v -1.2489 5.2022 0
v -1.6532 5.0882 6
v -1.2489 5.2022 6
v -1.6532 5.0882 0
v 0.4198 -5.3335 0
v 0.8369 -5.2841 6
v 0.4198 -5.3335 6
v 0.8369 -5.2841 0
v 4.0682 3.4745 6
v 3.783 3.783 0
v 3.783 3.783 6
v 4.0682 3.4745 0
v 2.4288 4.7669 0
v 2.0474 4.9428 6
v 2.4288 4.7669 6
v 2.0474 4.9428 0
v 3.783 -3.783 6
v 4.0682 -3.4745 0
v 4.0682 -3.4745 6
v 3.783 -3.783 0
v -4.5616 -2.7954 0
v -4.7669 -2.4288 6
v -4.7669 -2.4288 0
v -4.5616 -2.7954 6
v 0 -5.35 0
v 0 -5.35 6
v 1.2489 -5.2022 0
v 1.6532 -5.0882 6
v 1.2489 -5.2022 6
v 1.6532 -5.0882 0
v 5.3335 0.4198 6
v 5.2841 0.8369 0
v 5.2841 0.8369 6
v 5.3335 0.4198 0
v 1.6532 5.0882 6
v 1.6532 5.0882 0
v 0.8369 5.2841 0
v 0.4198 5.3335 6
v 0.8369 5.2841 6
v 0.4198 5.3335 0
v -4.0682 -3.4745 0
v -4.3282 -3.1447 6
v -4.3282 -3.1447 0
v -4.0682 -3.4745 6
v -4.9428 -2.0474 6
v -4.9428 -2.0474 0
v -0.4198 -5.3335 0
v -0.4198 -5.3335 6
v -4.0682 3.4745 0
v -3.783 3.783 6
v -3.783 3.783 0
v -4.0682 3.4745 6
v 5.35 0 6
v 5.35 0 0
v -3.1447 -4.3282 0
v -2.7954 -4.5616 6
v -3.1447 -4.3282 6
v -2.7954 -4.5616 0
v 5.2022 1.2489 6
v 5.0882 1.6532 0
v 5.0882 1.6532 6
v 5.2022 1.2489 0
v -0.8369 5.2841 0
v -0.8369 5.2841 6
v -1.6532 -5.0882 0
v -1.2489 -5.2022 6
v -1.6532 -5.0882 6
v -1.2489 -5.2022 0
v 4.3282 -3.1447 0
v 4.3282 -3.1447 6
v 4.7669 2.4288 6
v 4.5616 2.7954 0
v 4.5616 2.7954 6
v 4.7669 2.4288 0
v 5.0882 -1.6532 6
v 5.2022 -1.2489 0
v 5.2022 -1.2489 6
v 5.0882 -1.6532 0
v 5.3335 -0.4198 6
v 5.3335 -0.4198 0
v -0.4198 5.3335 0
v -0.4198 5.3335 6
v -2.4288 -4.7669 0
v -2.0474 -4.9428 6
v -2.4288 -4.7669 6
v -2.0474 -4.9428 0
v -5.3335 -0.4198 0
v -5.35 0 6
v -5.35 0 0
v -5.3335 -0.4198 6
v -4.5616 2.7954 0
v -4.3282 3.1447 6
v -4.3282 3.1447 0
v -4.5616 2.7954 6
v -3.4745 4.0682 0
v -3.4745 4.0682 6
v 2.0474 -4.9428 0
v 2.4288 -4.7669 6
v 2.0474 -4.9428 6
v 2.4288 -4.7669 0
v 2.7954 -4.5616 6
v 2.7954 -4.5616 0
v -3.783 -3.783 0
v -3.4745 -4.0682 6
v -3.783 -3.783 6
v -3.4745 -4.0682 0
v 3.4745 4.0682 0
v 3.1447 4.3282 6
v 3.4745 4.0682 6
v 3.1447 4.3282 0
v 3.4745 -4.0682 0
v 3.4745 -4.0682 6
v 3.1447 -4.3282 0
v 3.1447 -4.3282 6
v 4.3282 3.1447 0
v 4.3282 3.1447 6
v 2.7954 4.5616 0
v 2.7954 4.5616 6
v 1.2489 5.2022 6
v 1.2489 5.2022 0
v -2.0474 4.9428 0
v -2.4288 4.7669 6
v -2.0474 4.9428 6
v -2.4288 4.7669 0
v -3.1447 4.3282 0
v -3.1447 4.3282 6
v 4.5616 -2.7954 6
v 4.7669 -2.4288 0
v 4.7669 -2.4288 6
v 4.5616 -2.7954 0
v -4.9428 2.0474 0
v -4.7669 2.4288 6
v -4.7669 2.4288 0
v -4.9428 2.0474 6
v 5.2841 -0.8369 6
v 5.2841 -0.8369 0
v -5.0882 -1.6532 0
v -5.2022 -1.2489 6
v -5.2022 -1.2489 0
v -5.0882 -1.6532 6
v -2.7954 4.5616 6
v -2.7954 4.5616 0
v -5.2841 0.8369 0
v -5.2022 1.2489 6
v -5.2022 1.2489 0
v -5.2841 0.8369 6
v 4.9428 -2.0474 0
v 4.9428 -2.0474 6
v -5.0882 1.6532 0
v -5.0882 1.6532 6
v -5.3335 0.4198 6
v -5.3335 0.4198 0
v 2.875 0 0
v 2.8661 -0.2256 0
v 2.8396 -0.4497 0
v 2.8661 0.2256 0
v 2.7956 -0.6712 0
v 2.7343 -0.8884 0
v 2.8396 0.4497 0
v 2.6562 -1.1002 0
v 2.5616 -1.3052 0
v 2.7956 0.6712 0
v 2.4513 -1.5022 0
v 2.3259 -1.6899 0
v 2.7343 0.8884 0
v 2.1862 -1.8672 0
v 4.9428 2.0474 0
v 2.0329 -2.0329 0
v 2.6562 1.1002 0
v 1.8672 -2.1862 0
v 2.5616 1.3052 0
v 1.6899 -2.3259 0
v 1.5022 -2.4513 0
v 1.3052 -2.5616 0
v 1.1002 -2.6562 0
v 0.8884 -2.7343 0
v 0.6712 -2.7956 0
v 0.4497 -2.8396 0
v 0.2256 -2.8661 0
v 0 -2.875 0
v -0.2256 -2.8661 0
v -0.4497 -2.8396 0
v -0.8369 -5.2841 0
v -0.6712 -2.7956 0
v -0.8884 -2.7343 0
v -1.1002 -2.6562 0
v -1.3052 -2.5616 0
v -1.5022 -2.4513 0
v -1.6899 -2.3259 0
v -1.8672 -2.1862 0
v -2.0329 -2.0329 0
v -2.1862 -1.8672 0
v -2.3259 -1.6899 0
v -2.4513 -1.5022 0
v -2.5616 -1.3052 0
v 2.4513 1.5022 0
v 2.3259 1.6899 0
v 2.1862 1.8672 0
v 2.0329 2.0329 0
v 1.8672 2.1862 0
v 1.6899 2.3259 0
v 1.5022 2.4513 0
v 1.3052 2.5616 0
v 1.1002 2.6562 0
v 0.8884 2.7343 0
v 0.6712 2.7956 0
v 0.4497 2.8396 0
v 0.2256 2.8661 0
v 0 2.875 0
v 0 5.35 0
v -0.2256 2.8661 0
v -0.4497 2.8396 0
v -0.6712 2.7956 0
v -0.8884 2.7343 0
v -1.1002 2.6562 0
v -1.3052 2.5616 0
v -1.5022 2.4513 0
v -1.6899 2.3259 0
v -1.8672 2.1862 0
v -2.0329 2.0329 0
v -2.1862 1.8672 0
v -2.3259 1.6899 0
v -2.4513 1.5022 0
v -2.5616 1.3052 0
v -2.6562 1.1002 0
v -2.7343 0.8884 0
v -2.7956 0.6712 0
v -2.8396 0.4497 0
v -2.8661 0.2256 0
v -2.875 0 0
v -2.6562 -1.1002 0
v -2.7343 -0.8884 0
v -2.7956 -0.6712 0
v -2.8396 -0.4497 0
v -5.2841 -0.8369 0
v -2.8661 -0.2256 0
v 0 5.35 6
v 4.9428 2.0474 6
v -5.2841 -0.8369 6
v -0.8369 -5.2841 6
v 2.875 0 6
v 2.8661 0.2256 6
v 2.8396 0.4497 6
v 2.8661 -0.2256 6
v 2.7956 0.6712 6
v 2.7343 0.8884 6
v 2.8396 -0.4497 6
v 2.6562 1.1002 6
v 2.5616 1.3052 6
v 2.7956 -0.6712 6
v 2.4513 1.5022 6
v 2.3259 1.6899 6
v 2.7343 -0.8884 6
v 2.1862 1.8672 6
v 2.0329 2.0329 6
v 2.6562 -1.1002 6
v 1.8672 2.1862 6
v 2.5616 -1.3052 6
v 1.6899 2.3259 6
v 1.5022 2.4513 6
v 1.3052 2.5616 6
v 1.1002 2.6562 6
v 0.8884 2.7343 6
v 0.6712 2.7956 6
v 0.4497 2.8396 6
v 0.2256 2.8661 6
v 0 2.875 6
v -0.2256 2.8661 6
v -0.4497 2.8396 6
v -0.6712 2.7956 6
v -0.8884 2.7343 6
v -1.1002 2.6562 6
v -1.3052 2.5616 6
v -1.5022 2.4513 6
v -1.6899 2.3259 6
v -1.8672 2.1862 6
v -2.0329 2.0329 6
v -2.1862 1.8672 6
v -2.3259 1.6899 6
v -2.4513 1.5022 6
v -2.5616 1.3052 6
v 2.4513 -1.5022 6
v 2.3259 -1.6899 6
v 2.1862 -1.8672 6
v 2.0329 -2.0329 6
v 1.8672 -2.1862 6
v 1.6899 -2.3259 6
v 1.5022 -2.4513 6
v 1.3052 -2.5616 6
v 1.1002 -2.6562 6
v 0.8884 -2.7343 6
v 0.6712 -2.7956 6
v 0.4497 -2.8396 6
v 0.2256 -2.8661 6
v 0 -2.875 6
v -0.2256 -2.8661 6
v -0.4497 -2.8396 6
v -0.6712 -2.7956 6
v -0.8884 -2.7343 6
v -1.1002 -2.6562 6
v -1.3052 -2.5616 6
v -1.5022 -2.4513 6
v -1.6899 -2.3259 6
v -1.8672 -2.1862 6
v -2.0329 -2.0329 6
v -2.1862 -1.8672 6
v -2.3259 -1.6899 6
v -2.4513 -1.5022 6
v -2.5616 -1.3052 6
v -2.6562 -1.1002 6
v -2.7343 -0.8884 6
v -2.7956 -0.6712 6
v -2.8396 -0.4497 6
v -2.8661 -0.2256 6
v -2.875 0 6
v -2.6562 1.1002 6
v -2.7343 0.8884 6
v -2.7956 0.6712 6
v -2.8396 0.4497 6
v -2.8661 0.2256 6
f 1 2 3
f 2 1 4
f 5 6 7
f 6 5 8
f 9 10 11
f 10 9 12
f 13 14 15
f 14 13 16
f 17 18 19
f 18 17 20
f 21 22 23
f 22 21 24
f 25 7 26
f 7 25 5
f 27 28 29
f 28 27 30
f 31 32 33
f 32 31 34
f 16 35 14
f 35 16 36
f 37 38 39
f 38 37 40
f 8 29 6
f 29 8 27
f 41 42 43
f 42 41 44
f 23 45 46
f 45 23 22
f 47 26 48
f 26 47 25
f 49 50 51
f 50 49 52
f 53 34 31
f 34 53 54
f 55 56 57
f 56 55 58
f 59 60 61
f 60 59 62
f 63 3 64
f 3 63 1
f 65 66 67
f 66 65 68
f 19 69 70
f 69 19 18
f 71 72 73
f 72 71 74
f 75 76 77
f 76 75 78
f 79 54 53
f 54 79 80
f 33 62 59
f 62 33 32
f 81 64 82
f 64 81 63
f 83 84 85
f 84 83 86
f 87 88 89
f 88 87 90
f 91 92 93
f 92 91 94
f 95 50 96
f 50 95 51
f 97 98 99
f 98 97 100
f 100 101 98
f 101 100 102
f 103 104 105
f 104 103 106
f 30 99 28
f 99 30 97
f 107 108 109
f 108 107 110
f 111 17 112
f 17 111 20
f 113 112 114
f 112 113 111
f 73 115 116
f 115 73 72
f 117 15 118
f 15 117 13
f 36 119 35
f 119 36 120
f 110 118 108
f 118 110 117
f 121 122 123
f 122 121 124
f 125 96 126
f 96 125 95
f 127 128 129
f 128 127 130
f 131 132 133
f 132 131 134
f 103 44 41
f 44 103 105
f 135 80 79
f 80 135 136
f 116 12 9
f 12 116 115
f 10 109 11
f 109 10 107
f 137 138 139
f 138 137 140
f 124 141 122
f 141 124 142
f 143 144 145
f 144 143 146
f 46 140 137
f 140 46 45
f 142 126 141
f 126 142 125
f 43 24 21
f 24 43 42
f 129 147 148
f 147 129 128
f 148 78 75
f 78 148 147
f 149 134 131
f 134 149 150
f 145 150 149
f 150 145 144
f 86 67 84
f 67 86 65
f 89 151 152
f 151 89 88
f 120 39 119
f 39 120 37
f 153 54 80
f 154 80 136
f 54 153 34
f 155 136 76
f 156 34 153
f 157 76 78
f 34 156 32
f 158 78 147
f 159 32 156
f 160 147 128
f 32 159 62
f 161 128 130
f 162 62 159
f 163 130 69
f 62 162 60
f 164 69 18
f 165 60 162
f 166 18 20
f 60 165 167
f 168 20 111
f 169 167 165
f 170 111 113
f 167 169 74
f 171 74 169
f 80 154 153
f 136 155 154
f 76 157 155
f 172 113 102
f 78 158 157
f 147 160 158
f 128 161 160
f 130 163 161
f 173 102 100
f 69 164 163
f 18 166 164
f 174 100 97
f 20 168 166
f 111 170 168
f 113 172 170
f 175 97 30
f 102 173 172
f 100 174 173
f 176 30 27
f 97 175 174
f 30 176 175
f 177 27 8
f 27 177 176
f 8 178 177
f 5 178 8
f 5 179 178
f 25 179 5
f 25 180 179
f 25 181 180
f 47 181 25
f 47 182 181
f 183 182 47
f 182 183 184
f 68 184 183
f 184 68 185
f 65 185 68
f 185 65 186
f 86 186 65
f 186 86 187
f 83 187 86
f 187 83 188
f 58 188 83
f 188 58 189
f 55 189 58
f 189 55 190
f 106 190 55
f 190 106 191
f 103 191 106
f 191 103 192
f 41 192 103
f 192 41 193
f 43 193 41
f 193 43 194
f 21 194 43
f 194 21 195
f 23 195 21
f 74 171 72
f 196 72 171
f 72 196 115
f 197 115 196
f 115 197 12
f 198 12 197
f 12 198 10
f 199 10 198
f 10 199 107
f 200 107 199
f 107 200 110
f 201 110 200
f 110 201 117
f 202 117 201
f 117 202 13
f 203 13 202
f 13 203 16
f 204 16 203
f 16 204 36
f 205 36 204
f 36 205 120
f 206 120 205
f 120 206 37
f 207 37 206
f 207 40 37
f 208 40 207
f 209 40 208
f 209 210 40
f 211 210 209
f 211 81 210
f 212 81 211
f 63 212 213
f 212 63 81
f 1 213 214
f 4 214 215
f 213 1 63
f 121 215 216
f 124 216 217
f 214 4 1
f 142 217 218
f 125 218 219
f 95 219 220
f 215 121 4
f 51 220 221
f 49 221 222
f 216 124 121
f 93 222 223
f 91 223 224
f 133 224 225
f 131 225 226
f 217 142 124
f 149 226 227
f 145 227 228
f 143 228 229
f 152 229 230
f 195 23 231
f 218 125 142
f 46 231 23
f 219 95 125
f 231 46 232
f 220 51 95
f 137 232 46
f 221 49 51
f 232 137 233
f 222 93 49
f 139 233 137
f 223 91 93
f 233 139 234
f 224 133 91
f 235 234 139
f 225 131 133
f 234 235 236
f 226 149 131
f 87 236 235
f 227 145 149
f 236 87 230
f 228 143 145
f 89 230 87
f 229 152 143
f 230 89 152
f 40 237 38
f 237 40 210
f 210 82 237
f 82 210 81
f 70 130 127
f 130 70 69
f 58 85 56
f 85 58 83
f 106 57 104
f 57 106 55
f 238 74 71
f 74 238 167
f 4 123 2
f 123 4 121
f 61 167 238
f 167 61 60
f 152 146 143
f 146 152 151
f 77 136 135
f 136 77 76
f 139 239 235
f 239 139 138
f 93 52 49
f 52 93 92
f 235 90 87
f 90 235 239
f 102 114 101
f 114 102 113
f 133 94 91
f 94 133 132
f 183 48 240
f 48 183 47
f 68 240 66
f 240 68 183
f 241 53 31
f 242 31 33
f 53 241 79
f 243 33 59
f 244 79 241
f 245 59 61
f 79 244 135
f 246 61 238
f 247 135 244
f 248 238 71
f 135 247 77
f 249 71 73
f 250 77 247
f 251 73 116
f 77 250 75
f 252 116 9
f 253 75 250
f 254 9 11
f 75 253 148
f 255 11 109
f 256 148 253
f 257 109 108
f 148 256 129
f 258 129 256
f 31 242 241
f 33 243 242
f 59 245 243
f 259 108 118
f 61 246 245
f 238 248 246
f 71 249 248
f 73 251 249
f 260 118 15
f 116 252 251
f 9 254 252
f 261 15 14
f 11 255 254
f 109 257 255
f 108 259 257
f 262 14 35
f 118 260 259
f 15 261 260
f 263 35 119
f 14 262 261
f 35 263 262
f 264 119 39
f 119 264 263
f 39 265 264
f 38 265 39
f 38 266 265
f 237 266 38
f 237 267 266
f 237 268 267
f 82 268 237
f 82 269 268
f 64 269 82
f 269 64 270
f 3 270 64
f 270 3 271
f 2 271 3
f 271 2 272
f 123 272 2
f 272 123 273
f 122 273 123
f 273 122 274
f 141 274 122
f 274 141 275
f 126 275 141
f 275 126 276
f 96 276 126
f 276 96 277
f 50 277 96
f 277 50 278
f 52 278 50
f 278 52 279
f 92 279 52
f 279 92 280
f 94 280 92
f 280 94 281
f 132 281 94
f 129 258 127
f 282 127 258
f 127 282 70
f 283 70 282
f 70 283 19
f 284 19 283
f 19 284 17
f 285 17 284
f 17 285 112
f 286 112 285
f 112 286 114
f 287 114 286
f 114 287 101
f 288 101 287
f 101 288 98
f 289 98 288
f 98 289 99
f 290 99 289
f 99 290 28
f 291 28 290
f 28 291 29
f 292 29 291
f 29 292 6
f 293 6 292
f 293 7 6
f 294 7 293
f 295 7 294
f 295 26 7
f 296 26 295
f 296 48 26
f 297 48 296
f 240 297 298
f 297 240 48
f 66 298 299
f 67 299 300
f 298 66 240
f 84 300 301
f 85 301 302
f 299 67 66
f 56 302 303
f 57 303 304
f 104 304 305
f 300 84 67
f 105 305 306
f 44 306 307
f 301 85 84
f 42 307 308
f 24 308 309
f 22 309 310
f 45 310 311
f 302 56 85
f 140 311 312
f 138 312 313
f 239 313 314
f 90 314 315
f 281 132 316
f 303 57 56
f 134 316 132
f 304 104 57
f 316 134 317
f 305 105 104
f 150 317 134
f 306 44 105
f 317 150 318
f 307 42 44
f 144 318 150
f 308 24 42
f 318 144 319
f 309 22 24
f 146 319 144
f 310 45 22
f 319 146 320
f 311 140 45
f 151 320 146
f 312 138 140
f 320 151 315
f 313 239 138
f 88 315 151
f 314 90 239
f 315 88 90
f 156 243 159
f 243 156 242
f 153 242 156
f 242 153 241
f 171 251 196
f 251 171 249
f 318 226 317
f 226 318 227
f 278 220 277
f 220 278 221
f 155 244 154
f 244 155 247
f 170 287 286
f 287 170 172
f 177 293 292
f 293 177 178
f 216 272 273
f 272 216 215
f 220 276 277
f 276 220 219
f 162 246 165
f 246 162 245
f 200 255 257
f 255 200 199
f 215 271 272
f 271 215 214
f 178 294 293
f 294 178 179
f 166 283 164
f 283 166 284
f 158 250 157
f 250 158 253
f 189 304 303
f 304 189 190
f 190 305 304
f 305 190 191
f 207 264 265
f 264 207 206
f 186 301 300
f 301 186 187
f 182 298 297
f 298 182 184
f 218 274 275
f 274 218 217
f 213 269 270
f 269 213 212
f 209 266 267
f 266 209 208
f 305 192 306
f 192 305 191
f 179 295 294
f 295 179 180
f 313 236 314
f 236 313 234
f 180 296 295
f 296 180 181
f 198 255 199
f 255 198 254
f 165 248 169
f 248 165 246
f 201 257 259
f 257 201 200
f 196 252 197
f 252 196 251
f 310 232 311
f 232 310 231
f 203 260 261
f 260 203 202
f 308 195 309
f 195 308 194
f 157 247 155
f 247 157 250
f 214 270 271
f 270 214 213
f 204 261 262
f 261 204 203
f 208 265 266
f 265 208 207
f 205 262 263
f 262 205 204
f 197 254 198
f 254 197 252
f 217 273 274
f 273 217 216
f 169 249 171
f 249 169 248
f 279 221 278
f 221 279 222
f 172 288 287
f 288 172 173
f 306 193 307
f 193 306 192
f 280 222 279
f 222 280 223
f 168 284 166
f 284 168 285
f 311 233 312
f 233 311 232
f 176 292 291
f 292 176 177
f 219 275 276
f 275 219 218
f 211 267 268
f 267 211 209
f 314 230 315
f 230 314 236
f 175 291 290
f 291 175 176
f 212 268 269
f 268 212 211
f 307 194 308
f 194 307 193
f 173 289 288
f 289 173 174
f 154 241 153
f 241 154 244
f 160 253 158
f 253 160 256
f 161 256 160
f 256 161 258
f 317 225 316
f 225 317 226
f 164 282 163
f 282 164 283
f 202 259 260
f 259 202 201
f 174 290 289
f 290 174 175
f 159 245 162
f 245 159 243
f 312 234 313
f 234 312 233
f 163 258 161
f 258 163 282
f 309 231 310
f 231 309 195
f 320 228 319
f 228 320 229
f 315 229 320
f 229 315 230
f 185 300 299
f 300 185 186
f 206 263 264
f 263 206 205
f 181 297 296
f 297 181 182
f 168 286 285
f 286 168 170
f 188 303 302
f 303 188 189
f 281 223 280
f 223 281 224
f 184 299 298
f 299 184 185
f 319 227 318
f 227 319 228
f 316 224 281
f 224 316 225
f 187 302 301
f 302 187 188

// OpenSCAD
// file: ../shapes.scad
FACES   = 180;
EPSILON = 0.1;
PIN	    = 2.54;


module tube(h=1, inner=0, outer=0, di=0, do=0) {
    rInner = inner > 0 ? inner : di / 2;
    rOuter = outer > 0 ? outer : do / 2;

	if (rInner >= rOuter) echo("ERROR in tube. rOuter must be > rInner.");

	difference() {
		cylinder(h=h, r=rOuter);
		translate([0,0,-EPSILON]) {
			cylinder(h=h + EPSILON*2, r=rInner);
		}
	}
}

module roundedRect(size, r, up="z")
{
	if (up == "x") {
		H = size[0];
		hull()
		{
			translate([0, r, r]) rotate([0, 90, 0]) cylinder(r=r, h=H);
			translate([0, size[1] - r, r]) rotate([0, 90, 0]) cylinder(r=r, h=H);
			translate([0, r, size[2] - r]) rotate([0, 90, 0]) cylinder(r=r, h=H);
			translate([0, size[1] - r, size[2] - r]) rotate([0, 90, 0]) cylinder(r=r, h=H);
		}
	}
	else if (up == "y") {
		H = size[1];
		hull()
		{
			translate([r, 0, r]) rotate([-90, 0, 0]) cylinder(r=r, h=H);
			translate([size[0] - r, 0, r]) rotate([-90, 0, 0]) cylinder(r=r, h=H);
			translate([r, 0, size[2] - r]) rotate([-90, 0, 0]) cylinder(r=r, h=H);
			translate([size[0] - r, 0, size[2] - r]) rotate([-90, 0, 0]) cylinder(r=r, h=H);
		}
	}
	else {
		H = size[2];
		hull()
		{
			translate([r, r, 0])  cylinder(r=r, h=H);
			translate([size[0] - r, r, 0])  cylinder(r=r, h=H);
			translate([r, size[1] - r, 0])  cylinder(r=r, h=H);
			translate([size[0] - r, size[1] - r, 0])  cylinder(r=r, h=H);
		}
	}
}

module cubePair(x, size)
{
	translate([x, 0, 0])
		cube(size=size);
	mirror([1,0,0]) translate([x, 0, 0])
		cube(size=size);
}

module polygonXY(h, points)
{
    linear_extrude(height = h) {
        polygon(points=points);
    }  
}

module polygonYZ(h, points)
{
    multmatrix(m = [ [0, 0, 1, 0],
    				 [1, 0, 0, 0],
    				 [0, 1, 0, 0],
    				 [0, 0, 0, 1]
       			   ])
    linear_extrude(height = h) {
        polygon(points=points);
    }  	
}

module polygonXZ(h, points)
{
    multmatrix(m = [ [1, 0, 0, 0],
    				 [0, 0, 1, 0],
    				 [0, 1, 0, 0],
    				 [0, 0, 0, 1]
       			   ])
    linear_extrude(height = h) {
        polygon(points=points);
    }  	
}


module zCapsule(dz0, dz1, r, roundedRect=0)
{
	if (roundedRect == 0) {
		hull() {
			translate([0, 0, dz0]) rotate([-90, 0, 0]) cylinder(h=50, r=r);
			translate([0, 0, dz1]) rotate([-90, 0, 0]) cylinder(h=50, r=r);
		}
	}
	else {
		if (dz1 < dz0) {
			t = dz0;
			dz0 = dz1;
			dz1 = t;
		}
		hull() {
			translate([r - roundedRect, 0, dz0 - r + roundedRect]) 
				rotate([-90, 0, 0]) cylinder(h=50, r=roundedRect);
			translate([-r + roundedRect, 0, dz0 - r + roundedRect]) 
				rotate([-90, 0, 0]) cylinder(h=50, r=roundedRect);
			translate([r - roundedRect, 0, dz1 + r - roundedRect]) 
				rotate([-90, 0, 0]) cylinder(h=50, r=roundedRect);
			translate([-r + roundedRect, 0, dz1 + r - roundedRect]) 
				rotate([-90, 0, 0]) cylinder(h=50, r=roundedRect);
		}
	}
}


module xRoofCube(size)
{
	x = size[0];
	y = size[1];
	z = size[2];

	polygonXY(h=z, points=[
		[0, 0],
		[x, 0],
		[x, y + x],		// gets the 45 degree angle for printing
		[0, y]
	]);
}
// main file
use <../shapes.scad>
$fn = 80;
TRIM = 0.3;
tube(h=6.0, do=11.0-TRIM, di=5.45+TRIM);
